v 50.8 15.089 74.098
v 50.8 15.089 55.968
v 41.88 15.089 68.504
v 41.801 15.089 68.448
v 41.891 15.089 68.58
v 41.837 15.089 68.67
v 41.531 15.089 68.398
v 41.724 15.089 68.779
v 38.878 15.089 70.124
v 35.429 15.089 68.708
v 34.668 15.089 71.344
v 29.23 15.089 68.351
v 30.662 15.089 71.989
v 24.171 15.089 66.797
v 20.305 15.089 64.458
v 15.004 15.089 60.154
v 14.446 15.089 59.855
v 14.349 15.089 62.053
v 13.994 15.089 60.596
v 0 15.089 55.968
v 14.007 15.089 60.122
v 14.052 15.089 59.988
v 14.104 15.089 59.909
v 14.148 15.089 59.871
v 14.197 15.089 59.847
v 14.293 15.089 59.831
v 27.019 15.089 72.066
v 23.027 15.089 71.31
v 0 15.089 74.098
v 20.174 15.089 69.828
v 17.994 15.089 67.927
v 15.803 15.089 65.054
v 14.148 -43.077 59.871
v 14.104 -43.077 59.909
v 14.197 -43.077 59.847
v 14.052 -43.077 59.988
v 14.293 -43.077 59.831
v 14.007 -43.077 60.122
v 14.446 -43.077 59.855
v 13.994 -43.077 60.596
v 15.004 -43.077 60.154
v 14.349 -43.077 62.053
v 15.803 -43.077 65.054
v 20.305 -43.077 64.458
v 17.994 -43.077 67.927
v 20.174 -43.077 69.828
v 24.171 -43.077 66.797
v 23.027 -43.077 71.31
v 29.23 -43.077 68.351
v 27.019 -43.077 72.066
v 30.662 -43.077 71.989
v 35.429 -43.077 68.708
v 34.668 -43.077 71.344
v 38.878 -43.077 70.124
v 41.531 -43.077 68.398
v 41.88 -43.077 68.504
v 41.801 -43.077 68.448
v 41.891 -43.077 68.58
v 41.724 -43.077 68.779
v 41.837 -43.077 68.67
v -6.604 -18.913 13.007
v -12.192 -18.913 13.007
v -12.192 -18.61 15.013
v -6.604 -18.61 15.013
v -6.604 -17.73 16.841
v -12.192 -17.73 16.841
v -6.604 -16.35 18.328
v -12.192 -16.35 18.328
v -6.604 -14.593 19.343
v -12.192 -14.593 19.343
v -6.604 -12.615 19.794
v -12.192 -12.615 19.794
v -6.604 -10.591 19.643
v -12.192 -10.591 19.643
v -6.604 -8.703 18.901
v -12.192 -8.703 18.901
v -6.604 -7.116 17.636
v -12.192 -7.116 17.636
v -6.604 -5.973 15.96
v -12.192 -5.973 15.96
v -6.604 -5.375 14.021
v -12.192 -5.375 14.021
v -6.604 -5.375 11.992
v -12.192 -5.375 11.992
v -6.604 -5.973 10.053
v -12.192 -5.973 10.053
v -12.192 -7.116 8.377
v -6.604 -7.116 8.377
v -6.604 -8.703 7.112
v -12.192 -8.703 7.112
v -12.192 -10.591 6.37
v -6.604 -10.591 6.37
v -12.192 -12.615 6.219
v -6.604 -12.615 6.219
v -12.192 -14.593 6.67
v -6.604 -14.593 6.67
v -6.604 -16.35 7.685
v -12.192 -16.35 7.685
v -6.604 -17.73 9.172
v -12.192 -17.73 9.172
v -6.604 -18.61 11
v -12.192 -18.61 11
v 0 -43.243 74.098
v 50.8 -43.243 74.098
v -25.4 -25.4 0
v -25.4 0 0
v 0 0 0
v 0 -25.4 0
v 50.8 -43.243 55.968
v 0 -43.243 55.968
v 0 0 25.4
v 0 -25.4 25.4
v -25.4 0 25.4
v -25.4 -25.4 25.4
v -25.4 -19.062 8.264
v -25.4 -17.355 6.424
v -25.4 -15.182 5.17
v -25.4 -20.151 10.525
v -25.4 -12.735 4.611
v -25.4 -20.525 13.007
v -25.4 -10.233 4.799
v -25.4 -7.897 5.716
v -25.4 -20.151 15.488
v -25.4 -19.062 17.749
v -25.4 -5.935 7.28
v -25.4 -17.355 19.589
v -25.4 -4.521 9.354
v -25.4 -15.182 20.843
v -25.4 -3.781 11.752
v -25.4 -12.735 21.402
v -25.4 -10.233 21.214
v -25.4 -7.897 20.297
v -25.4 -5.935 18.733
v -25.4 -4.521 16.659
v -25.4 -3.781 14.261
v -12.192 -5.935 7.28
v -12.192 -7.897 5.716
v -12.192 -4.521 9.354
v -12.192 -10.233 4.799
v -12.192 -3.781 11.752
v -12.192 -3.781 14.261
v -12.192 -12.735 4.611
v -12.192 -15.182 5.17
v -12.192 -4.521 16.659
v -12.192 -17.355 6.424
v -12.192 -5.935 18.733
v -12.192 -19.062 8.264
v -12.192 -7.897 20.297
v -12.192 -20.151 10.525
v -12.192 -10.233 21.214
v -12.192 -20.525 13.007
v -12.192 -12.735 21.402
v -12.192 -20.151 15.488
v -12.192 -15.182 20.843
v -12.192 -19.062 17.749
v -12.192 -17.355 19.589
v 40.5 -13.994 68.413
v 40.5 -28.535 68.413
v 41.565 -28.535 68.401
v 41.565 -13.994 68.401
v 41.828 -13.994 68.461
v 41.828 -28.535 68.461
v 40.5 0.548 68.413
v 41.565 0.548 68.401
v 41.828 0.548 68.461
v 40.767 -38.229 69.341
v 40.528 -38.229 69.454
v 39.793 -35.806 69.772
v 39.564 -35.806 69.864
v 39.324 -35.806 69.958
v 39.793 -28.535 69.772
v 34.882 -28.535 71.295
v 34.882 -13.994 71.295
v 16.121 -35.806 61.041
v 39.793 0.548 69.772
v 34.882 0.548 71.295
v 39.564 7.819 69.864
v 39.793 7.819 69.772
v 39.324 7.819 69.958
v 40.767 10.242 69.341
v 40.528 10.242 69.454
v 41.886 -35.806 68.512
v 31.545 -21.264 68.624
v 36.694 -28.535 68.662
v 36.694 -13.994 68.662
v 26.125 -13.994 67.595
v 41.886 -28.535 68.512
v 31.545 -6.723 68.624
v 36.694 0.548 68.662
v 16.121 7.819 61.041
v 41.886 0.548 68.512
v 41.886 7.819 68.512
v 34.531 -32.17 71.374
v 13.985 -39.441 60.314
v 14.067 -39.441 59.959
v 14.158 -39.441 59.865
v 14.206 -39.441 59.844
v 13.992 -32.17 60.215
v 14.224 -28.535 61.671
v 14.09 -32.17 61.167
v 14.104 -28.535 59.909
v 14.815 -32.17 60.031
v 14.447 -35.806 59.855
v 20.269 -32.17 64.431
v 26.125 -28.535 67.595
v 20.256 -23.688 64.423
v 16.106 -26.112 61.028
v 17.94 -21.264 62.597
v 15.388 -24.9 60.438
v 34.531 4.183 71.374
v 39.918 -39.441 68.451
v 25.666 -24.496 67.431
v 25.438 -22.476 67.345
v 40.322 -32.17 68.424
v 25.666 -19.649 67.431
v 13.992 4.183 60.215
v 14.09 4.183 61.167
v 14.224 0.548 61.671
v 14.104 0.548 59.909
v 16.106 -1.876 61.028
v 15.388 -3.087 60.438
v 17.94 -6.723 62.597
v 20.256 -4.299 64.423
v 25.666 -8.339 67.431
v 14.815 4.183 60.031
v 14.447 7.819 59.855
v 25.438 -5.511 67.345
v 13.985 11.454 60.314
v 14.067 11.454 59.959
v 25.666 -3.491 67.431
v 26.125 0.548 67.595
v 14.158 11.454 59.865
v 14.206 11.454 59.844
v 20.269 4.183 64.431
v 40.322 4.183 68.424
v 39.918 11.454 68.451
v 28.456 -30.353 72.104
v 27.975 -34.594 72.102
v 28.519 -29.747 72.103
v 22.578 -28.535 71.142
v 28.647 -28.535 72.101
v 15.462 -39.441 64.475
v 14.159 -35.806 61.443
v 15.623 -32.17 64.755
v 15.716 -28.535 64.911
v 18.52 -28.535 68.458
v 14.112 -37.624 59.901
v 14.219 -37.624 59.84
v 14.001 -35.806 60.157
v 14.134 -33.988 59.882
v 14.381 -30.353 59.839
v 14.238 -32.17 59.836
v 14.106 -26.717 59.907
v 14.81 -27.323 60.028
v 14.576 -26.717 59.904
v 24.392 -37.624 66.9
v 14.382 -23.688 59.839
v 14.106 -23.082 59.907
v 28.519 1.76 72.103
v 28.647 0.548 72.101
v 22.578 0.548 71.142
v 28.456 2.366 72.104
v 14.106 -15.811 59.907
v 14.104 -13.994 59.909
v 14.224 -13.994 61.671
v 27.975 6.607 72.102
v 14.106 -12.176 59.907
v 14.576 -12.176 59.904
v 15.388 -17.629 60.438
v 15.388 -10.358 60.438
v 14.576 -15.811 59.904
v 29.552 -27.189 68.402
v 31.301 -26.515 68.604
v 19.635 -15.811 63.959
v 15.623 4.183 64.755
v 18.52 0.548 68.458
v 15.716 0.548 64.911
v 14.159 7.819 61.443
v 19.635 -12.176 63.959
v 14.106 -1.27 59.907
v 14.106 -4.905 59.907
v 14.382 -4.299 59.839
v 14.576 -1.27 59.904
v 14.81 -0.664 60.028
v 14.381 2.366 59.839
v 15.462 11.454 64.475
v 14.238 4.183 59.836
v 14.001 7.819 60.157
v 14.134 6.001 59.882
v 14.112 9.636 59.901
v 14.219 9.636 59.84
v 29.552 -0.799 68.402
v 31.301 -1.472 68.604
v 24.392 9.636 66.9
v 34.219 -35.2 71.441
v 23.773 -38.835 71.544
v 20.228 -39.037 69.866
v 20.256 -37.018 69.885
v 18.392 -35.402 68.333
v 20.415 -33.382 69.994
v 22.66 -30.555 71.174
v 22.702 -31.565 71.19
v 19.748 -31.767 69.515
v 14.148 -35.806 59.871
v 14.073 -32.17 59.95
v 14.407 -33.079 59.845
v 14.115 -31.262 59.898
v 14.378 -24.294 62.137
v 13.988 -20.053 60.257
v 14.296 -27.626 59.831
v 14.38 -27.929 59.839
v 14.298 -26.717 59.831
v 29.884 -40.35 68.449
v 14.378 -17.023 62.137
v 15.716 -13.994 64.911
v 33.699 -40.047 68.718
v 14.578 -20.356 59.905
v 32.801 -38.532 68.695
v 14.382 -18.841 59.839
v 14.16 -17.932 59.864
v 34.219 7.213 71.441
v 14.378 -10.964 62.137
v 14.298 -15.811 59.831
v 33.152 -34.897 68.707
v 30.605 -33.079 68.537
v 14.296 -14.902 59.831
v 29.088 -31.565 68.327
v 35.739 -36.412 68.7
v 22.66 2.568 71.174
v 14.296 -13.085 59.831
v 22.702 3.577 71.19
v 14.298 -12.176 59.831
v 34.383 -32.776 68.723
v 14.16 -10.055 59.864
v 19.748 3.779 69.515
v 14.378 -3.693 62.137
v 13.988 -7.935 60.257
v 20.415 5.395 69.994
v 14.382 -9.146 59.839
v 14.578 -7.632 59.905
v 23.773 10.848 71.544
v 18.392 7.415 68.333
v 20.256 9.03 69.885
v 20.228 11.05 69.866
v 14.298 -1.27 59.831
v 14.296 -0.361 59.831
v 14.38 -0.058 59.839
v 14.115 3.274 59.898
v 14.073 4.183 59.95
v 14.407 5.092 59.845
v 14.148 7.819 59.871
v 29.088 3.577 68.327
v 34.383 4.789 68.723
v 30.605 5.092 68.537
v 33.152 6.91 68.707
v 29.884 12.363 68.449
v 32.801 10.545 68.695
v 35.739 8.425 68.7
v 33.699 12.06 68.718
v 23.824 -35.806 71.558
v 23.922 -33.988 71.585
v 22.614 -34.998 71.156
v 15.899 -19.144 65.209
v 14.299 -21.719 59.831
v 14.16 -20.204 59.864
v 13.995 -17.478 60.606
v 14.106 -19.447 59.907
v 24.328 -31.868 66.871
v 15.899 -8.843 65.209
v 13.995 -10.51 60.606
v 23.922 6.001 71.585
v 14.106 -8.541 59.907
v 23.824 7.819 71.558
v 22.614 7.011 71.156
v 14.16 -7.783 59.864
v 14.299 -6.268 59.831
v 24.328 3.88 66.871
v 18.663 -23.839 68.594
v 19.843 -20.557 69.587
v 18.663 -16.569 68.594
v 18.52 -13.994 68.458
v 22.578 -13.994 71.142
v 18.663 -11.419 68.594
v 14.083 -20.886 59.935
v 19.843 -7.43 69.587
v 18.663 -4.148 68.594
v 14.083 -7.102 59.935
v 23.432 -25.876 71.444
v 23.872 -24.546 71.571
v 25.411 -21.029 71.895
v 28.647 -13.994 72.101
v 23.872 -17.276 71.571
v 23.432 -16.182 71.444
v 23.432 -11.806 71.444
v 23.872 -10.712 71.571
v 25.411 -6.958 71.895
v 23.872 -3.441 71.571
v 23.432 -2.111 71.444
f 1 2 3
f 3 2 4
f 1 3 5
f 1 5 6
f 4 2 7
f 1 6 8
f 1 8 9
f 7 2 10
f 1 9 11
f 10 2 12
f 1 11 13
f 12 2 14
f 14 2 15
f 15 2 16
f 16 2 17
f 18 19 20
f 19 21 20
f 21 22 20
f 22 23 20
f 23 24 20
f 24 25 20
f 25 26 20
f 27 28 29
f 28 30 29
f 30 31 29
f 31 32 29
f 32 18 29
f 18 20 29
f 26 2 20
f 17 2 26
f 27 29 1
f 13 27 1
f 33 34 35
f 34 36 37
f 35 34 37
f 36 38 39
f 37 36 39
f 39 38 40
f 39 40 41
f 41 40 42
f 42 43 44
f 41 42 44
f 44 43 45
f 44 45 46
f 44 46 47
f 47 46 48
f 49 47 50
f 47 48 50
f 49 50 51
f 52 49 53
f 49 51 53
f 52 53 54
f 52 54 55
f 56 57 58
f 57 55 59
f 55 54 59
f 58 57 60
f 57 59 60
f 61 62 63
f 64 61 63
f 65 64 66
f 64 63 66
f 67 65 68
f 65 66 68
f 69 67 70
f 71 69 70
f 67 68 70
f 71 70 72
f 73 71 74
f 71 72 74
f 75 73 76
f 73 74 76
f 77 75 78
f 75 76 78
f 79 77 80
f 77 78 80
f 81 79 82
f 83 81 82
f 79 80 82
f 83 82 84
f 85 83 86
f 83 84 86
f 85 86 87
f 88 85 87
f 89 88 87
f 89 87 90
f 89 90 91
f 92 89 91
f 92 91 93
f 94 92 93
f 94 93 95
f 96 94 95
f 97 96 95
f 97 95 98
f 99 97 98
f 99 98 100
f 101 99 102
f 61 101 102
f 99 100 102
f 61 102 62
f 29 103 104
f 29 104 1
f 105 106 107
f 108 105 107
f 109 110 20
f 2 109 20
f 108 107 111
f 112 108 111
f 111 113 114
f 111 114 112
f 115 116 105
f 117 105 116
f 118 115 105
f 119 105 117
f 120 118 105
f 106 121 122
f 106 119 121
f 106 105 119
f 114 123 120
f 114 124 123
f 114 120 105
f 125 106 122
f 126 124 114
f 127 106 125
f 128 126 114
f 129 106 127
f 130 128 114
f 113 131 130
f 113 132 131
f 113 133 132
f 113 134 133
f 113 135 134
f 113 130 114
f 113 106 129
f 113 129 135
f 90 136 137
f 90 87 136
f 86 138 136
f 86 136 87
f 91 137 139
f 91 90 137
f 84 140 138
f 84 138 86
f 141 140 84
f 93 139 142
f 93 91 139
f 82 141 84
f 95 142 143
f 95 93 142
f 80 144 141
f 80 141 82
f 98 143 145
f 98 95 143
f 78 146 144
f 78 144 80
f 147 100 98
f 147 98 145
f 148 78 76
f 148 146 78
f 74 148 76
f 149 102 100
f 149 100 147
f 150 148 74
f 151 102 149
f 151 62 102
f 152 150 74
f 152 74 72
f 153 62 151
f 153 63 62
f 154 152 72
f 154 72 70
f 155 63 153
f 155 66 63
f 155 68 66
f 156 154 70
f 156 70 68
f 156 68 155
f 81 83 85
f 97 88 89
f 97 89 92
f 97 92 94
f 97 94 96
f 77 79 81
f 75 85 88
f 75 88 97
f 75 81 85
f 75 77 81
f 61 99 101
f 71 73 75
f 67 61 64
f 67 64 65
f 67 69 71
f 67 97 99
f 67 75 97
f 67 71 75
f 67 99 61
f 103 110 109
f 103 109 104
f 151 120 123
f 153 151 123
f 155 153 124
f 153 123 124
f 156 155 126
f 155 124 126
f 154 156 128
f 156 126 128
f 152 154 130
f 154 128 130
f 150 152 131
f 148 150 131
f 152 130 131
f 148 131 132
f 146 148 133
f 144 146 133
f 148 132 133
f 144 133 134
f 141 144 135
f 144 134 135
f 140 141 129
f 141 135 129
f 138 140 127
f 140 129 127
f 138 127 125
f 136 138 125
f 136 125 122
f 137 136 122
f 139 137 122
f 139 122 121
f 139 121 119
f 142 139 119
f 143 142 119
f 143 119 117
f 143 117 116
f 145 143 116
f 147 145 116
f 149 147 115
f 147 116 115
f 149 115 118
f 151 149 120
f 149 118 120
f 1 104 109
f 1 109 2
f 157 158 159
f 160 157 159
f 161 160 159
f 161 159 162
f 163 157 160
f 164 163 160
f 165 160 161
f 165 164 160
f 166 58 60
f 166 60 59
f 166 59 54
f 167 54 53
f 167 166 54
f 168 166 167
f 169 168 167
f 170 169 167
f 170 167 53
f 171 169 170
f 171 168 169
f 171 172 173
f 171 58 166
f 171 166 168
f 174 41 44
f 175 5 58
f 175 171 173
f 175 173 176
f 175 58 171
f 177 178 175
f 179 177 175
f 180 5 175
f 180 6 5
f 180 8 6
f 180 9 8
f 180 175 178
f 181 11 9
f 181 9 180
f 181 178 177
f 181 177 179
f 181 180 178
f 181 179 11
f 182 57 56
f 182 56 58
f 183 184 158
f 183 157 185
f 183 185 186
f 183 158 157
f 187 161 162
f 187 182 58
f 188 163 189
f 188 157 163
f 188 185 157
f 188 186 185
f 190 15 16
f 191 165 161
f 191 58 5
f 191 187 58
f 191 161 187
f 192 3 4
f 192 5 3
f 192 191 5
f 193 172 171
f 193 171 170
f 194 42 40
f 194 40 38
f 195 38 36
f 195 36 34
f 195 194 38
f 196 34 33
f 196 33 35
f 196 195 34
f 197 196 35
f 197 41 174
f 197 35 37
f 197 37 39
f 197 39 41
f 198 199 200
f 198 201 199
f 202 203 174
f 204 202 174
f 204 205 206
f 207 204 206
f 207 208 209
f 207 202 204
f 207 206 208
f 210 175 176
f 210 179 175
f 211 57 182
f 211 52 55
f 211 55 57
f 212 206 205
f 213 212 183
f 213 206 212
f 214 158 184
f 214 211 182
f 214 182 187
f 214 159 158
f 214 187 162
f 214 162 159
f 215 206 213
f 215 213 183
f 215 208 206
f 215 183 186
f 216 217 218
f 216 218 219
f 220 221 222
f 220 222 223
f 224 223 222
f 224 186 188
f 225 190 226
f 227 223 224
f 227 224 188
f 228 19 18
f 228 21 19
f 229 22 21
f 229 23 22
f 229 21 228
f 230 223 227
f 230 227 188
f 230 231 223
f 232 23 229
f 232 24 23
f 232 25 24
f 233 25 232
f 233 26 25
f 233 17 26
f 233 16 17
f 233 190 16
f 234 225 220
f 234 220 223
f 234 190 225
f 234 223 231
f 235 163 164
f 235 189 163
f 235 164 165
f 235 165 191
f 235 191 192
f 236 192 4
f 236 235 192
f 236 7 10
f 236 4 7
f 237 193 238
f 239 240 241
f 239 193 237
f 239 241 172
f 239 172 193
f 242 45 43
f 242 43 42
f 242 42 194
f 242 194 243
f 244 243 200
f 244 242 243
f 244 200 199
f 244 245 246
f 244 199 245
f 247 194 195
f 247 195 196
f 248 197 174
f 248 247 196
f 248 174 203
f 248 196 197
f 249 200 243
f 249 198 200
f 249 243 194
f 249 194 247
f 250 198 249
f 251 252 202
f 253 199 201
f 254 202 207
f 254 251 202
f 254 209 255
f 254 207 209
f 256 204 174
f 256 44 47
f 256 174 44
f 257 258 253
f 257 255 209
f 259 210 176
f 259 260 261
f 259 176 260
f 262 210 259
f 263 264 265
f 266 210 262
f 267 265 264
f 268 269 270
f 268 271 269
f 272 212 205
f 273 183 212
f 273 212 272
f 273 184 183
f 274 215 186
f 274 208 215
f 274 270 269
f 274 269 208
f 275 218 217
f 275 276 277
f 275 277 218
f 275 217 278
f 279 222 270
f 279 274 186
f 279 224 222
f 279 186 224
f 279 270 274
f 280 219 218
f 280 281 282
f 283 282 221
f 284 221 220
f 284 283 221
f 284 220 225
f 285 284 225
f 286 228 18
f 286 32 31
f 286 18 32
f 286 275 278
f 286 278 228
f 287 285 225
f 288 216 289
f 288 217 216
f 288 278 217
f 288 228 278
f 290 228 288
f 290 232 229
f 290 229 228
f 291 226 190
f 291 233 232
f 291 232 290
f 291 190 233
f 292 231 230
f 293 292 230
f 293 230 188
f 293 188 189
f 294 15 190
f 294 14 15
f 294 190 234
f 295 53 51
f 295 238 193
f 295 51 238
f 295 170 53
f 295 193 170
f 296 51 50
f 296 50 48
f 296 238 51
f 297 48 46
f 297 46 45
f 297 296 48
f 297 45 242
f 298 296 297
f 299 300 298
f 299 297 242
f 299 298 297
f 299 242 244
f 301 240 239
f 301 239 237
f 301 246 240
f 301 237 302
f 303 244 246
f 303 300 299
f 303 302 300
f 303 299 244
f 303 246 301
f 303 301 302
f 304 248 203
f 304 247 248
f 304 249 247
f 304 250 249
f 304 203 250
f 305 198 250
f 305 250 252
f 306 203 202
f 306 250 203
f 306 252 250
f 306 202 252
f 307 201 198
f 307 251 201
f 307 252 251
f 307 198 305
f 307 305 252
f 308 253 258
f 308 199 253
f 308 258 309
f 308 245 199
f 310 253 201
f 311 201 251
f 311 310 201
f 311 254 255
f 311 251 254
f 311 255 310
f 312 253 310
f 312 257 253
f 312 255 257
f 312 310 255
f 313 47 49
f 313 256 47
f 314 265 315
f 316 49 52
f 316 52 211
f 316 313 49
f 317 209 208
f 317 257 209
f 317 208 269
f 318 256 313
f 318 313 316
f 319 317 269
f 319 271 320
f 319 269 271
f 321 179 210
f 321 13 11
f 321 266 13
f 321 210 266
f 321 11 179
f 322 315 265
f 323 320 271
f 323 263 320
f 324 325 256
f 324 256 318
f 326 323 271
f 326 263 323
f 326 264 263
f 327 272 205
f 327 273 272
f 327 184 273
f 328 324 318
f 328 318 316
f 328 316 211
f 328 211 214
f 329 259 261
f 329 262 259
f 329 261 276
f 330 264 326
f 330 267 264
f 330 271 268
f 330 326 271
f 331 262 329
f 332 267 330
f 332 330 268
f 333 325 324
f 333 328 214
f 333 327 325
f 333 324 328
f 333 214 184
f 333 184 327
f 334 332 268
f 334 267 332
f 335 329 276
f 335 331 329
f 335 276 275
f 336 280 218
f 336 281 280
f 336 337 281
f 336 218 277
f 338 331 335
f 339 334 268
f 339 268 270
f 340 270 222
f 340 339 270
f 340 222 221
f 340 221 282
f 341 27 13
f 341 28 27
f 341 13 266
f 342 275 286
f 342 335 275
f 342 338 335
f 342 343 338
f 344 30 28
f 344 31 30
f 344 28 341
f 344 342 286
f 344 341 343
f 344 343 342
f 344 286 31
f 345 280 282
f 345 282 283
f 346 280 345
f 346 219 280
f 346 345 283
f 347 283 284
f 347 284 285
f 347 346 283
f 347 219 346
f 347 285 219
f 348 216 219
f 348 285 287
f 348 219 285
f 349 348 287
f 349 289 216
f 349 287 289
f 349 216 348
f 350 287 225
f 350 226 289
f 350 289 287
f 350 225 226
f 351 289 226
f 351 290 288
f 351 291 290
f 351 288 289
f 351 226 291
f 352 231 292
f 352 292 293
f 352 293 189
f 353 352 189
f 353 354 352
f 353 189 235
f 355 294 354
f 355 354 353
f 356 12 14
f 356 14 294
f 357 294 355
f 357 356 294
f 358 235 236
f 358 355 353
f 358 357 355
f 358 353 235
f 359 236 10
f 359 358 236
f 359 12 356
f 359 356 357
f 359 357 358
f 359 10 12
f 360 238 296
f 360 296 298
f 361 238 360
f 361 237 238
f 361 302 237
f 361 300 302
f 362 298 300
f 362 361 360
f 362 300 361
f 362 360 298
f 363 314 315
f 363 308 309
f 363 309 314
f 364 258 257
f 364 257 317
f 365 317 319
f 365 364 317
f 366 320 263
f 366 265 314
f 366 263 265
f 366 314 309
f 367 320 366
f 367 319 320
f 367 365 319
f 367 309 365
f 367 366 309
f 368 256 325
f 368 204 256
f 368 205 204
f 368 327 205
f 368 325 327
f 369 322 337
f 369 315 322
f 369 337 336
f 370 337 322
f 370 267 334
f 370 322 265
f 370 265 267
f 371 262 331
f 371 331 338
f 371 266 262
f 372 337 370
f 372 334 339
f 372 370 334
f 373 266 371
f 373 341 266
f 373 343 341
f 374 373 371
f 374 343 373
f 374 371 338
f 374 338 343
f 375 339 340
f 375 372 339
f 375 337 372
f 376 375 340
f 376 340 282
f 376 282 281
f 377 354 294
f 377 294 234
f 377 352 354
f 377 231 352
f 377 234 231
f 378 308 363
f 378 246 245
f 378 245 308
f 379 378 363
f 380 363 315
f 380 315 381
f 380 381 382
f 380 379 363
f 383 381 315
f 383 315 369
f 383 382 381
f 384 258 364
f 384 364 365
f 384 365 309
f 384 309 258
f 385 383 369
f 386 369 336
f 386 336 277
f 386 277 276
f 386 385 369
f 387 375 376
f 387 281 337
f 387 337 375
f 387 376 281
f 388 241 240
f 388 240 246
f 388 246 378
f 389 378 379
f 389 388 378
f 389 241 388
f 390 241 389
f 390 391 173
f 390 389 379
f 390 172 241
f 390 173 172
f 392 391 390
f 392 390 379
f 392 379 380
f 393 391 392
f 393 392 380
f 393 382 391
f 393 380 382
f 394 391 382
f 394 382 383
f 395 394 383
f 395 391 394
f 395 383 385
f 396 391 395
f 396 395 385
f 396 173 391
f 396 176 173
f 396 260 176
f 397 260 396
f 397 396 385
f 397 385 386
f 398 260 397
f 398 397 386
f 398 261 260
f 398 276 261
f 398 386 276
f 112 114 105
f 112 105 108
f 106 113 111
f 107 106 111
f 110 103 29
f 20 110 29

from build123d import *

# Parameters (mm, degrees)
F0_W      = 25.4
F0_H      = 25.4
F1_DEPTH  = 25.4
F2_DEPTH  = 25.4
F3_R      = 8.1587505768
F3_R_2    = 8.1026
F4_DEPTH  = 12.7
F5_R      = 9.6221334919
F6_DEPTH  = 12.7
F7_R      = 8.4187899488
F8_DEPTH  = 13.208
F9_R      = 6.8067308035
F10_DEPTH = 5.588
F11_W     = 58.332407847
F11_H     = 18.1303396821
F12_DEPTH = 50.8
F14_DEPTH = 58.166


with BuildPart() as f1:
    # F0 (on Front) → F1 (new body)
    with BuildSketch(Plane.XZ):
        with Locations((-12.7, 12.7)):
            Rectangle(F0_W, F0_H)
    extrude(amount=F1_DEPTH)

    # F0 (on Front) → F2 (join)
    with BuildSketch(Plane.XZ):
        with Locations((-12.7, 12.7)):
            Rectangle(F0_W, F0_H)
    extrude(amount=F2_DEPTH)

    # F3 (on face) → F4 (join)
    with BuildSketch(Plane.XZ.offset(25.4)):
        with Locations((-11.3450856879, 11.8241375312)):
            Circle(F3_R)
        with Locations((-11.3450856879, 11.8241375312)):
            Circle(F3_R_2, mode=Mode.SUBTRACT)
        with Locations((-11.3450856879, 11.8241375312)):
            Circle(F3_R_2)
    extrude(amount=-F4_DEPTH)

    # F5 (on face) → F6 (join)
    with BuildSketch(Plane.YZ):
        with Locations((-13.1187057123, 12.8094833344)):
            Circle(F5_R)
    extrude(amount=-F6_DEPTH)

    # F7 (on face) → F8 (cut)
    with BuildSketch(Plane(origin=(-25.4, 0, 0), x_dir=(0, -1, 0), z_dir=(-1, 0, 0))):
        with Locations((12.1061233804, 13.0065521225)):
            Circle(F7_R)
    extrude(amount=-F8_DEPTH, mode=Mode.SUBTRACT)

    # F9 (on face) → F10 (cut)
    with BuildSketch(Plane(origin=(-12.192, 0, 0), x_dir=(0, -1, 0), z_dir=(-1, 0, 0))):
        with Locations((12.1061233804, 13.0065521225)):
            Circle(F9_R)
    extrude(amount=-F10_DEPTH, mode=Mode.SUBTRACT)


with BuildPart() as f12:
    # F11 (on Right) → F12 (new body)
    with BuildSketch(Plane.YZ):
        with Locations((-14.0768131241, 65.0327578187)):
            Rectangle(F11_W, F11_H)
    extrude(amount=F12_DEPTH)

    # F13 (on face) → F14 (cut)
    with BuildSketch(Plane(origin=(0, 15.0893907994, 0), x_dir=(-1, 0, 0), z_dir=(0, 1, 0))):
        with BuildLine():
            add(Edge.make_bspline(
                [(-41.8907739222, 68.5800015926), (-41.6314921901, 69.4821352758), (-19.925940684, 77.9589324958), (-10.2704026467, 52.7941414948), (-24.4338228003, 72.0033694044), (-42.1242450817, 67.7676721034), (-41.8907739222, 68.5800015926)],
                knots=[0, 0, 0, 0, 0.277308253, 0.5129791028, 0.7502967956, 1, 1, 1, 1], degree=3))
        make_face()
    extrude(amount=-F14_DEPTH, mode=Mode.SUBTRACT)


solid = Compound([f1.part, f12.part])
